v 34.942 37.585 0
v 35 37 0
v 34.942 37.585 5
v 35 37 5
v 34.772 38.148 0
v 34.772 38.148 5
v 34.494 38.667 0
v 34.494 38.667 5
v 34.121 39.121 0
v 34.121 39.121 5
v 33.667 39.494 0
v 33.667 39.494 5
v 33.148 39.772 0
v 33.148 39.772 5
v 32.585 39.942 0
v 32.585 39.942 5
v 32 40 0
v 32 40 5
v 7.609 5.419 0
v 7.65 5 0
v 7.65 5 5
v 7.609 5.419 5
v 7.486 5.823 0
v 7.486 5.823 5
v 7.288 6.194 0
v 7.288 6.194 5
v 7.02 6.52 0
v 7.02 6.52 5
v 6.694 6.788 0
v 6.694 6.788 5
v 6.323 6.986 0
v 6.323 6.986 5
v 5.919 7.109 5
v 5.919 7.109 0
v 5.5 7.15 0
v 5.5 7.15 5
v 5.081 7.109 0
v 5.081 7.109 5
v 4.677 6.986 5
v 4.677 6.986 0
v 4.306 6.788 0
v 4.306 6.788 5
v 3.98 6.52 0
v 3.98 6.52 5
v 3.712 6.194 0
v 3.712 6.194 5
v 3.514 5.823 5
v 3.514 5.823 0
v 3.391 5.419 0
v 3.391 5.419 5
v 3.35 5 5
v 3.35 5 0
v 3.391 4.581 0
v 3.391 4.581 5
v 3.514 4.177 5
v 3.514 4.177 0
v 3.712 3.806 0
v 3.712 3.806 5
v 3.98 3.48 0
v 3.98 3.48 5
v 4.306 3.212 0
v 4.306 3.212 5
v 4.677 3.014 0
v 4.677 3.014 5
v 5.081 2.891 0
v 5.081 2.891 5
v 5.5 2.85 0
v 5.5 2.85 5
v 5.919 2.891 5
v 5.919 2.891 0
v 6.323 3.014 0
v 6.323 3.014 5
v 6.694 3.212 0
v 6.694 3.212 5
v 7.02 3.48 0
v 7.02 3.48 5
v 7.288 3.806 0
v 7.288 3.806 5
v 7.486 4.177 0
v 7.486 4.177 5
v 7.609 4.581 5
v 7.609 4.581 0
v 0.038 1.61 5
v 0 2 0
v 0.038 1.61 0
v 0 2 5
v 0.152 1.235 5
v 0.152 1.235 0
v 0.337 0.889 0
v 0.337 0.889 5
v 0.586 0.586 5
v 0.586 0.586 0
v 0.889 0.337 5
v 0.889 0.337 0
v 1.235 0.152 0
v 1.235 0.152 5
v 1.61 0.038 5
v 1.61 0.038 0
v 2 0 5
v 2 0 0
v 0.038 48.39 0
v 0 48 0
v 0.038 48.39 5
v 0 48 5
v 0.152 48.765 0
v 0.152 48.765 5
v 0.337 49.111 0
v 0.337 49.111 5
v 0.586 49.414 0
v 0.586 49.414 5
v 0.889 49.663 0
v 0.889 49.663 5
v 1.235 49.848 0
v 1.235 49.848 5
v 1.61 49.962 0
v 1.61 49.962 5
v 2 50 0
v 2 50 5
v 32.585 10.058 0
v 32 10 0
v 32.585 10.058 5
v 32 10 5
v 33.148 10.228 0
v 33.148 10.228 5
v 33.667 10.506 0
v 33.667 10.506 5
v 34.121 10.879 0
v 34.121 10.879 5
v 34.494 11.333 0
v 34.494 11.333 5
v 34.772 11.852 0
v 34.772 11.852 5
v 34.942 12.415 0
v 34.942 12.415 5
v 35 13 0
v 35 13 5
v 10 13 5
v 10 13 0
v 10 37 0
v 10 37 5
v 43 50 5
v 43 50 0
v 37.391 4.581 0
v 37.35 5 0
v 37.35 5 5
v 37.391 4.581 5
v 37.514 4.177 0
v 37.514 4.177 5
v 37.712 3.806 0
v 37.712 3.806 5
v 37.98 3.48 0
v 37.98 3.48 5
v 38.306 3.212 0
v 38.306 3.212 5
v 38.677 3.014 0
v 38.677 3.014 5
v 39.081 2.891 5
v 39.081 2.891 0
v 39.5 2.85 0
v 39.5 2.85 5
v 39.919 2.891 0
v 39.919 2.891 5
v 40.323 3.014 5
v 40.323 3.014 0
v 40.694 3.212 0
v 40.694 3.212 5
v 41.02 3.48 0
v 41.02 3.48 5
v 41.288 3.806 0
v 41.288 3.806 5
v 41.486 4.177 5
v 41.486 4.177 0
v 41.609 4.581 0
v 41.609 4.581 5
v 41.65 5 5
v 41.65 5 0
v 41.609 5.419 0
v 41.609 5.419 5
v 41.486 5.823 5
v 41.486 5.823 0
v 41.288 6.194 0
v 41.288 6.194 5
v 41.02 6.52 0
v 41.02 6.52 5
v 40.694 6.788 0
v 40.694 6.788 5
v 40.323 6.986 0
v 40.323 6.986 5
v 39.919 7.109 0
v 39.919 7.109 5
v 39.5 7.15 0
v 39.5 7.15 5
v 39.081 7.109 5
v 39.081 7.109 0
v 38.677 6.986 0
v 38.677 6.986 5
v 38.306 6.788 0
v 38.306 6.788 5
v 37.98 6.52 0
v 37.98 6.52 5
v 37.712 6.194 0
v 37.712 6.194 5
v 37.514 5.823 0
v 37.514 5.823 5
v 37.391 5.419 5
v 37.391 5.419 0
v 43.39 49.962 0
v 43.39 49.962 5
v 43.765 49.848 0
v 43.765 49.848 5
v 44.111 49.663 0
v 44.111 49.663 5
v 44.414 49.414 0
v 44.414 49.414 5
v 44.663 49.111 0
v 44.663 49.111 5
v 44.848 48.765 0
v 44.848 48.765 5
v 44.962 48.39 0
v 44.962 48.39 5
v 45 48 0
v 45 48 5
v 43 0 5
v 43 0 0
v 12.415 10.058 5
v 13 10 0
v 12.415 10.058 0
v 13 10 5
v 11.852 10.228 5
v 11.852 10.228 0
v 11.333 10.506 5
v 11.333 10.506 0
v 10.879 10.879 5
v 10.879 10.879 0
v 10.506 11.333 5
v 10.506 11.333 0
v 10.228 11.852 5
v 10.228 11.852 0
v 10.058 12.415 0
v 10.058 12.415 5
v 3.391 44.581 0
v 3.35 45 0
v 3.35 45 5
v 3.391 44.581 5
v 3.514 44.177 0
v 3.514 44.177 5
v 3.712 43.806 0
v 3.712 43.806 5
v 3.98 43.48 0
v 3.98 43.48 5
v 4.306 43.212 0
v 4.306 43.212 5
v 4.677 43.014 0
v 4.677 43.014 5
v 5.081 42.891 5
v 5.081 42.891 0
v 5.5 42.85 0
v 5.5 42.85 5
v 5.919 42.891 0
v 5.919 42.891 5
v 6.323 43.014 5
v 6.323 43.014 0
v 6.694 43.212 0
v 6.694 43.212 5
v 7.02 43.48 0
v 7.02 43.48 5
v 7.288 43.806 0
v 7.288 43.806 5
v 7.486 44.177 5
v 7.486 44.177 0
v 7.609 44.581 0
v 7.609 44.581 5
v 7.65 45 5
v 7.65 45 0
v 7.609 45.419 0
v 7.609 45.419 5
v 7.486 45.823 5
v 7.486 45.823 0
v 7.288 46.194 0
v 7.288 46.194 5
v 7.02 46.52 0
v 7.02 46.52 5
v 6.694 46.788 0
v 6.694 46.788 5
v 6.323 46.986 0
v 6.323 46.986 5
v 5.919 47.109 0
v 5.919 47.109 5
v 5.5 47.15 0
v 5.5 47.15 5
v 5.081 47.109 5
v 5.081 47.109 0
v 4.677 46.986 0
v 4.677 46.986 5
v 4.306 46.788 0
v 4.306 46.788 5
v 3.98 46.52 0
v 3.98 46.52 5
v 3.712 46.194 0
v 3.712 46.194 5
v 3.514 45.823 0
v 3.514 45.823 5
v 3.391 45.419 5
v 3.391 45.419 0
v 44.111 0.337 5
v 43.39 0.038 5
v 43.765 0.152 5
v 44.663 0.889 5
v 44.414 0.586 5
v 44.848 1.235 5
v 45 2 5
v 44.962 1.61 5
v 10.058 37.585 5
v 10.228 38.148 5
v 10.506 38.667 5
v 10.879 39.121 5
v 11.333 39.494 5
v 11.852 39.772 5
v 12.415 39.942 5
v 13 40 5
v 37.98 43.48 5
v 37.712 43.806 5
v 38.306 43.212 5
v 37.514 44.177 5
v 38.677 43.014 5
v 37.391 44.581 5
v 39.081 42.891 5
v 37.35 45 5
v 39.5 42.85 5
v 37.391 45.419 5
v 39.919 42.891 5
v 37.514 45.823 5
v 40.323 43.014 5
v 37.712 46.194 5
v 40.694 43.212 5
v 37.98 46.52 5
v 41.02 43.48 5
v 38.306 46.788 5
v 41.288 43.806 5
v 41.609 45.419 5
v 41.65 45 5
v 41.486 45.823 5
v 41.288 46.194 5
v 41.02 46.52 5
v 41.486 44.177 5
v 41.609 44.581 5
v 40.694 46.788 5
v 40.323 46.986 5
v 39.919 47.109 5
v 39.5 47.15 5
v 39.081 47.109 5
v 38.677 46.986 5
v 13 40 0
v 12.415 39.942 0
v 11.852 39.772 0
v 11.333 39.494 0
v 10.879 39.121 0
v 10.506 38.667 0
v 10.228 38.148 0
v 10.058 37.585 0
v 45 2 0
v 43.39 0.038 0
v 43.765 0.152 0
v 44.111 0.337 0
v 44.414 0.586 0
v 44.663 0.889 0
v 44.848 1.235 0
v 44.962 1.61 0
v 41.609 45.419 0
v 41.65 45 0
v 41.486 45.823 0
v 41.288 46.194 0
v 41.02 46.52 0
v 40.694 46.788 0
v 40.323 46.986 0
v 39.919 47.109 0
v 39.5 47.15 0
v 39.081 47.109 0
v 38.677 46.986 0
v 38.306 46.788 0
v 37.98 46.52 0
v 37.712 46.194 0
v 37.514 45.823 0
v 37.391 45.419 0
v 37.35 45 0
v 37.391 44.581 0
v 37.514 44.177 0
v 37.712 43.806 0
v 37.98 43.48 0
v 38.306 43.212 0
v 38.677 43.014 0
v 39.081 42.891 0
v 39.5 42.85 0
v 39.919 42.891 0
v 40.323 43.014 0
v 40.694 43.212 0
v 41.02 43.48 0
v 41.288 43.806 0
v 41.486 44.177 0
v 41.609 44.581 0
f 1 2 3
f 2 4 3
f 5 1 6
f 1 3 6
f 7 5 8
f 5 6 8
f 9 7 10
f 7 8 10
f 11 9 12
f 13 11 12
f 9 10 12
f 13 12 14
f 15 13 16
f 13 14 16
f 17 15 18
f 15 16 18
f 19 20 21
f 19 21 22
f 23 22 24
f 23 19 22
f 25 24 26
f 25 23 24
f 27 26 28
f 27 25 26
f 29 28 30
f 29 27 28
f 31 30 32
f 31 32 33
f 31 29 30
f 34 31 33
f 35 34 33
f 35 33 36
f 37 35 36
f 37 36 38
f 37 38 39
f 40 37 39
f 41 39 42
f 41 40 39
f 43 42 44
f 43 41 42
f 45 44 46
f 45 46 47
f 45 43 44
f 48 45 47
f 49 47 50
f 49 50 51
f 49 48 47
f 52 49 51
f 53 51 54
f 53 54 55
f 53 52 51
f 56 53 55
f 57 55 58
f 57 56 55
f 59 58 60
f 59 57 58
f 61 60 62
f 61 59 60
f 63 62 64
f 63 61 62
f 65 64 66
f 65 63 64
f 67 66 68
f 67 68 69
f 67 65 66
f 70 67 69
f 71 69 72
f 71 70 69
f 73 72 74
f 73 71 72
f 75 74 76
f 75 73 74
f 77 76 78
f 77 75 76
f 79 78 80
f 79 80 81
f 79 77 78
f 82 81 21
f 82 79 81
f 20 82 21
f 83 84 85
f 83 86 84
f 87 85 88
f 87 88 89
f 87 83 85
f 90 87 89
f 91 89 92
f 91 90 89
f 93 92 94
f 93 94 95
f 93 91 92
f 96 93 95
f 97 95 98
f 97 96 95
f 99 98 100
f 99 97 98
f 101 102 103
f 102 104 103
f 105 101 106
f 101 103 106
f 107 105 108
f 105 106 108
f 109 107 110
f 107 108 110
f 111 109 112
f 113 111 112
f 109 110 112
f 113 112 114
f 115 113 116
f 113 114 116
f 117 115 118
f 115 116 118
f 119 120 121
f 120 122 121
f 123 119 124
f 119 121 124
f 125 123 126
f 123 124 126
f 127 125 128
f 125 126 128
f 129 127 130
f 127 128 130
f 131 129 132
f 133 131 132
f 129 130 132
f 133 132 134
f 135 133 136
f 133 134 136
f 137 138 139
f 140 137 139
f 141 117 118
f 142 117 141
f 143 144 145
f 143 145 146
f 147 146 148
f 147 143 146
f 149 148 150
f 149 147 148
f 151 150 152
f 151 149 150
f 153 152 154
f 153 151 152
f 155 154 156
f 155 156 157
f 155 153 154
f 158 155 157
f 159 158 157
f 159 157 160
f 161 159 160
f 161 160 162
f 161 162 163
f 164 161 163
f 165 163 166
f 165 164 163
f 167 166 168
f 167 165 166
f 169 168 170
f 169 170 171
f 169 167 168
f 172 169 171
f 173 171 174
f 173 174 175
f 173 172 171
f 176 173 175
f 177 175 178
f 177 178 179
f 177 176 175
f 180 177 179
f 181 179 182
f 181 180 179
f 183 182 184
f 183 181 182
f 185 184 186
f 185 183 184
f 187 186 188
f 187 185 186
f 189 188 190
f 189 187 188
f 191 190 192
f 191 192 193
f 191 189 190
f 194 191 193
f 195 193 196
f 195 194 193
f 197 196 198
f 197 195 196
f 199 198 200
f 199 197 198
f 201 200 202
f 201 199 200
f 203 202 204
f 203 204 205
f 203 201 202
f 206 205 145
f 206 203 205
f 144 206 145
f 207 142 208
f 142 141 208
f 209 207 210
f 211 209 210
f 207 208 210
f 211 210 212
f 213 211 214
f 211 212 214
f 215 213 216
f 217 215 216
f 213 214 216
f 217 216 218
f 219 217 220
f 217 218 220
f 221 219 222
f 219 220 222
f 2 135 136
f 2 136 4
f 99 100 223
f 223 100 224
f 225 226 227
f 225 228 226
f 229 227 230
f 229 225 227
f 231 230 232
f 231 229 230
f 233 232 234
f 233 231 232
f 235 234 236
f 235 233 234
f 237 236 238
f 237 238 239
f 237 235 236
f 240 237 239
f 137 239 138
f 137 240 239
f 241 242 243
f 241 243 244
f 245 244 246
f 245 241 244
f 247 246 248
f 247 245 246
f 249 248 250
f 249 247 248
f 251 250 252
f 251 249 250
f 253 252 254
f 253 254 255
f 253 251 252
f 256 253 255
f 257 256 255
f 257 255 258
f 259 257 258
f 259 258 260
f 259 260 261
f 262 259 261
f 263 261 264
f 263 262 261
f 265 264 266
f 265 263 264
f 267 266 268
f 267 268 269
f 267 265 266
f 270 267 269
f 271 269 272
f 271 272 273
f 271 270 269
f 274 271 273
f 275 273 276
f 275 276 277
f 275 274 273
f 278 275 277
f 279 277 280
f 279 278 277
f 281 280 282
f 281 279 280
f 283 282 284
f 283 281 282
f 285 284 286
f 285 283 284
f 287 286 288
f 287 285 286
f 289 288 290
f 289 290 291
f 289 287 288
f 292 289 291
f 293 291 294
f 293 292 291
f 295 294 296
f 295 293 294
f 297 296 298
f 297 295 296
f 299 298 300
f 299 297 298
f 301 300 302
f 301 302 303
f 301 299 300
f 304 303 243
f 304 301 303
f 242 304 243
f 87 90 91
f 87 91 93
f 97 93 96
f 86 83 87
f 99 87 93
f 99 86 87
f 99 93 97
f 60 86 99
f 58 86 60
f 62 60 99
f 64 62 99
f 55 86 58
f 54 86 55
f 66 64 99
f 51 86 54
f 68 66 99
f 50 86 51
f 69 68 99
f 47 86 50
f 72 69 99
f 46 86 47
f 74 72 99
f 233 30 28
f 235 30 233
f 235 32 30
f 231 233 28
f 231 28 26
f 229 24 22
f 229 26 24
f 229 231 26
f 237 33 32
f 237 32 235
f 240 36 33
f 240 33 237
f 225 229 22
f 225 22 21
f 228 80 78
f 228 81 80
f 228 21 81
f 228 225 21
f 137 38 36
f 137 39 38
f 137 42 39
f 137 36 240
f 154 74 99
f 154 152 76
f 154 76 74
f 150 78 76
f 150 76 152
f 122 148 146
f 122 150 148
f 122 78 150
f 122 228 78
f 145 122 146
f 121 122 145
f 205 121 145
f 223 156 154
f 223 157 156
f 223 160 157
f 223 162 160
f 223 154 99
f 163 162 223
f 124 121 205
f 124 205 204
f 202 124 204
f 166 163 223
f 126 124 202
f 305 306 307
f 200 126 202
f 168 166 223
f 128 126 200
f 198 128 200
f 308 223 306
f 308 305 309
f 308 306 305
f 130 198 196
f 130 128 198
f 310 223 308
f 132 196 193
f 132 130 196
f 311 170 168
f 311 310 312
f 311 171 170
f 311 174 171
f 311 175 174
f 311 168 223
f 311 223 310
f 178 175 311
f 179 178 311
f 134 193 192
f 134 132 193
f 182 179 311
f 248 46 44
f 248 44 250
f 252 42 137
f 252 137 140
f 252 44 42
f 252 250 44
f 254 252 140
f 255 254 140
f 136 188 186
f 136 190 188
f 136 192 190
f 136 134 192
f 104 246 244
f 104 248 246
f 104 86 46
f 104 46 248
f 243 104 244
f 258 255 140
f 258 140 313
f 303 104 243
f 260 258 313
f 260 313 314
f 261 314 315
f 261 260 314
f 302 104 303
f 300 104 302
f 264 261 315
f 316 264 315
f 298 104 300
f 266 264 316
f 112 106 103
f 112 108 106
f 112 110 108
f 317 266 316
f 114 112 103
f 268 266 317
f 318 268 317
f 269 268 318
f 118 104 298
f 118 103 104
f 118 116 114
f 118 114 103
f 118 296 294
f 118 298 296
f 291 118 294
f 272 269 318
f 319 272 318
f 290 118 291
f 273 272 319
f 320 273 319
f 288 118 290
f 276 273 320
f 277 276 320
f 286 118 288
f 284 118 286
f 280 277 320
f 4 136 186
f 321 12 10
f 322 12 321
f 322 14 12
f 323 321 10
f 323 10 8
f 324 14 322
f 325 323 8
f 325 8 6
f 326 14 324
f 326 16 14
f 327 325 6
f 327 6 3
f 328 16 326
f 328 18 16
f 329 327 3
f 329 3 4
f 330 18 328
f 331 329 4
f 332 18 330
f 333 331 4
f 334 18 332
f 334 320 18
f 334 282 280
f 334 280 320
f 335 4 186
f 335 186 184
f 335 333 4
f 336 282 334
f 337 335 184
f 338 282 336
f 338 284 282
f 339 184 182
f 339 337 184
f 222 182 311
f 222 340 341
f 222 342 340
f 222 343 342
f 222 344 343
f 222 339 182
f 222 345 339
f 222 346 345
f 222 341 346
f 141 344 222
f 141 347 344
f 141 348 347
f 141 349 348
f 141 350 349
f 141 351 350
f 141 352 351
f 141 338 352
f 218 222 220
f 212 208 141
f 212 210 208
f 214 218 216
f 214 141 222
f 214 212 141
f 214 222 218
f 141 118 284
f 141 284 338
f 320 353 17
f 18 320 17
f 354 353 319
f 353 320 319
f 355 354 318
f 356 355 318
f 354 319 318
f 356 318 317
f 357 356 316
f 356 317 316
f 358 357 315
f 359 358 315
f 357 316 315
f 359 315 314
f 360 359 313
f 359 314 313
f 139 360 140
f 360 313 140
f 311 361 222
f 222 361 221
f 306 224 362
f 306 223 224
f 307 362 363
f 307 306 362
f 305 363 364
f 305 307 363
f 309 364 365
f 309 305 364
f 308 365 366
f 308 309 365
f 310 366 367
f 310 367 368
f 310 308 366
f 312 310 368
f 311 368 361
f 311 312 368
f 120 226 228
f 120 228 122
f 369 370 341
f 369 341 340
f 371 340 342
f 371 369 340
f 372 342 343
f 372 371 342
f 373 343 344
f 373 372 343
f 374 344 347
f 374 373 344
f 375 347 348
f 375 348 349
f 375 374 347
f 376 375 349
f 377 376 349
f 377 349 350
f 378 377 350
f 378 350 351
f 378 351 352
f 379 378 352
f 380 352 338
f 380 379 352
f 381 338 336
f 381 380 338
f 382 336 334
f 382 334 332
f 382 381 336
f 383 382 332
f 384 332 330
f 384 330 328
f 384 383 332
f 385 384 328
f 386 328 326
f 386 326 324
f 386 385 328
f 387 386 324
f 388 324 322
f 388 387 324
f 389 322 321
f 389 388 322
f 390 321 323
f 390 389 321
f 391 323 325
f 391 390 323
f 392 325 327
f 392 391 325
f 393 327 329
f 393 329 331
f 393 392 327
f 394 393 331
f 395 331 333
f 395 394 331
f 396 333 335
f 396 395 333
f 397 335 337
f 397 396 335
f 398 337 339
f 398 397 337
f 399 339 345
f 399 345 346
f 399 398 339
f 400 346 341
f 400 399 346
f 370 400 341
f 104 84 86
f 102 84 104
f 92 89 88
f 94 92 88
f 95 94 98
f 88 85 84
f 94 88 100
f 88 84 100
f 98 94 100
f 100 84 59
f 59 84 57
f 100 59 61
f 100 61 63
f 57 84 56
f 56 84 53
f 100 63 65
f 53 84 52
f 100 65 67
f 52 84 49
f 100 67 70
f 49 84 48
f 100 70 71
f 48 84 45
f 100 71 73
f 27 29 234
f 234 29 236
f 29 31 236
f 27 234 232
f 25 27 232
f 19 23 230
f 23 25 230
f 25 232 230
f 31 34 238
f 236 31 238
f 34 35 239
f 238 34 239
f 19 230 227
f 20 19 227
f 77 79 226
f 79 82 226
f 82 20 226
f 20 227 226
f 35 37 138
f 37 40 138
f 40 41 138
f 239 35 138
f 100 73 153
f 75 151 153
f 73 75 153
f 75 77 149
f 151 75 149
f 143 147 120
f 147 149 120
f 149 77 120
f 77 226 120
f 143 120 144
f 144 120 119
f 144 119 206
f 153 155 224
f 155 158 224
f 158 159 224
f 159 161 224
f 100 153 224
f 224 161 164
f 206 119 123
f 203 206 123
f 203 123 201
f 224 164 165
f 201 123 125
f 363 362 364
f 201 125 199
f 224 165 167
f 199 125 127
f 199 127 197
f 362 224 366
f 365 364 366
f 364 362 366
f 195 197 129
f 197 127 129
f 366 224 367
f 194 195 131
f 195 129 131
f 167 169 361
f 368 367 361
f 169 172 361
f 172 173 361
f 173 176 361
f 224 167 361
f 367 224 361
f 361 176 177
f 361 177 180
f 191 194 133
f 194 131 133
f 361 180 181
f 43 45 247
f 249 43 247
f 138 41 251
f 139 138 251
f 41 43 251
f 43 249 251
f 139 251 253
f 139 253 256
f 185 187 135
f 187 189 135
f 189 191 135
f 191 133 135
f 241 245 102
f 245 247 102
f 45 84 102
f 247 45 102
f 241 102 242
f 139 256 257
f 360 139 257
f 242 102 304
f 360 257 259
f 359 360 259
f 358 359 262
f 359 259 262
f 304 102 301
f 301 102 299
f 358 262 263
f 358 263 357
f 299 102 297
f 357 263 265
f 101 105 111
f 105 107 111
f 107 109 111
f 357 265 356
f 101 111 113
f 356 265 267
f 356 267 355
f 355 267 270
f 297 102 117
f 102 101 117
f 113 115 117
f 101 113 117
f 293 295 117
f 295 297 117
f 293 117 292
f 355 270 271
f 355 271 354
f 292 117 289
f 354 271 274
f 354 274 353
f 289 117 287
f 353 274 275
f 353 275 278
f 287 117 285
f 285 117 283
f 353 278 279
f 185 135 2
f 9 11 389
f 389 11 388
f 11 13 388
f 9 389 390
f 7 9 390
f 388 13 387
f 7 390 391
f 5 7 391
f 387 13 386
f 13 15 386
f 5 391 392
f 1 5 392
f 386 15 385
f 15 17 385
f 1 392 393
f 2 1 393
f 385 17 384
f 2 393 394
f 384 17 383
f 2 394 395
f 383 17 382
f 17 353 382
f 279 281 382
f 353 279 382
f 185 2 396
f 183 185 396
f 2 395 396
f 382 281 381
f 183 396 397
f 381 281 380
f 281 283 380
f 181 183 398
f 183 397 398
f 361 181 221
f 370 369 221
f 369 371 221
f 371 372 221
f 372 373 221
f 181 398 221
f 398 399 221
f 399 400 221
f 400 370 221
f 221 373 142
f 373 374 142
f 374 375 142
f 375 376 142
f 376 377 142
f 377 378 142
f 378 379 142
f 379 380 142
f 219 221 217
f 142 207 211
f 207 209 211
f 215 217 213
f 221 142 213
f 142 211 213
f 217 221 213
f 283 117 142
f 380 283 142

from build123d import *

# Parameters (mm, degrees)
SKETCH_1_W      = 45
SKETCH_1_H      = 50
SKETCH_1_R      = 2.15
SKETCH_1_W_2    = 25
SKETCH_1_H_2    = 30
EXTRUDE_1_DEPTH = 5
FILLET_1_R      = 2
FILLET_2_R      = 3


with BuildPart() as part:
    # ｽｹｯﾁ1 → ﾎﾞｽ - 押し出し1 (new body)
    with BuildSketch(Plane.XY):
        with Locations((22.5, 25)):
            Rectangle(SKETCH_1_W, SKETCH_1_H)
        with Locations((5.5, 5)):
            Circle(SKETCH_1_R, mode=Mode.SUBTRACT)
        with Locations(Location((5.5, 45, 0), (0, 0, 180))):
            Circle(SKETCH_1_R, mode=Mode.SUBTRACT)
        with Locations(Location((39.5, 5, 0), (0, 0, 180))):
            Circle(SKETCH_1_R, mode=Mode.SUBTRACT)
        with Locations((39.5, 45)):
            Circle(SKETCH_1_R, mode=Mode.SUBTRACT)
        with Locations((22.5, 25)):
            Rectangle(SKETCH_1_W_2, SKETCH_1_H_2, mode=Mode.SUBTRACT)
    extrude(amount=EXTRUDE_1_DEPTH)

    # ﾌｨﾚｯﾄ1
    fillet_1_edges = [part.edges().sort_by_distance(p)[0] for p in [
        (0, 50, 2.5),
        (45, 50, 2.5),
        (45, 0, 2.5),
        (0, 0, 2.5),
    ]]
    fillet(fillet_1_edges, radius=FILLET_1_R)

    # ﾌｨﾚｯﾄ2
    fillet_2_edges = [part.edges().sort_by_distance(p)[0] for p in [
        (35, 10, 2.5),
        (35, 40, 2.5),
        (10, 40, 2.5),
        (10, 10, 2.5),
    ]]
    fillet(fillet_2_edges, radius=FILLET_2_R)


solid = part.part
